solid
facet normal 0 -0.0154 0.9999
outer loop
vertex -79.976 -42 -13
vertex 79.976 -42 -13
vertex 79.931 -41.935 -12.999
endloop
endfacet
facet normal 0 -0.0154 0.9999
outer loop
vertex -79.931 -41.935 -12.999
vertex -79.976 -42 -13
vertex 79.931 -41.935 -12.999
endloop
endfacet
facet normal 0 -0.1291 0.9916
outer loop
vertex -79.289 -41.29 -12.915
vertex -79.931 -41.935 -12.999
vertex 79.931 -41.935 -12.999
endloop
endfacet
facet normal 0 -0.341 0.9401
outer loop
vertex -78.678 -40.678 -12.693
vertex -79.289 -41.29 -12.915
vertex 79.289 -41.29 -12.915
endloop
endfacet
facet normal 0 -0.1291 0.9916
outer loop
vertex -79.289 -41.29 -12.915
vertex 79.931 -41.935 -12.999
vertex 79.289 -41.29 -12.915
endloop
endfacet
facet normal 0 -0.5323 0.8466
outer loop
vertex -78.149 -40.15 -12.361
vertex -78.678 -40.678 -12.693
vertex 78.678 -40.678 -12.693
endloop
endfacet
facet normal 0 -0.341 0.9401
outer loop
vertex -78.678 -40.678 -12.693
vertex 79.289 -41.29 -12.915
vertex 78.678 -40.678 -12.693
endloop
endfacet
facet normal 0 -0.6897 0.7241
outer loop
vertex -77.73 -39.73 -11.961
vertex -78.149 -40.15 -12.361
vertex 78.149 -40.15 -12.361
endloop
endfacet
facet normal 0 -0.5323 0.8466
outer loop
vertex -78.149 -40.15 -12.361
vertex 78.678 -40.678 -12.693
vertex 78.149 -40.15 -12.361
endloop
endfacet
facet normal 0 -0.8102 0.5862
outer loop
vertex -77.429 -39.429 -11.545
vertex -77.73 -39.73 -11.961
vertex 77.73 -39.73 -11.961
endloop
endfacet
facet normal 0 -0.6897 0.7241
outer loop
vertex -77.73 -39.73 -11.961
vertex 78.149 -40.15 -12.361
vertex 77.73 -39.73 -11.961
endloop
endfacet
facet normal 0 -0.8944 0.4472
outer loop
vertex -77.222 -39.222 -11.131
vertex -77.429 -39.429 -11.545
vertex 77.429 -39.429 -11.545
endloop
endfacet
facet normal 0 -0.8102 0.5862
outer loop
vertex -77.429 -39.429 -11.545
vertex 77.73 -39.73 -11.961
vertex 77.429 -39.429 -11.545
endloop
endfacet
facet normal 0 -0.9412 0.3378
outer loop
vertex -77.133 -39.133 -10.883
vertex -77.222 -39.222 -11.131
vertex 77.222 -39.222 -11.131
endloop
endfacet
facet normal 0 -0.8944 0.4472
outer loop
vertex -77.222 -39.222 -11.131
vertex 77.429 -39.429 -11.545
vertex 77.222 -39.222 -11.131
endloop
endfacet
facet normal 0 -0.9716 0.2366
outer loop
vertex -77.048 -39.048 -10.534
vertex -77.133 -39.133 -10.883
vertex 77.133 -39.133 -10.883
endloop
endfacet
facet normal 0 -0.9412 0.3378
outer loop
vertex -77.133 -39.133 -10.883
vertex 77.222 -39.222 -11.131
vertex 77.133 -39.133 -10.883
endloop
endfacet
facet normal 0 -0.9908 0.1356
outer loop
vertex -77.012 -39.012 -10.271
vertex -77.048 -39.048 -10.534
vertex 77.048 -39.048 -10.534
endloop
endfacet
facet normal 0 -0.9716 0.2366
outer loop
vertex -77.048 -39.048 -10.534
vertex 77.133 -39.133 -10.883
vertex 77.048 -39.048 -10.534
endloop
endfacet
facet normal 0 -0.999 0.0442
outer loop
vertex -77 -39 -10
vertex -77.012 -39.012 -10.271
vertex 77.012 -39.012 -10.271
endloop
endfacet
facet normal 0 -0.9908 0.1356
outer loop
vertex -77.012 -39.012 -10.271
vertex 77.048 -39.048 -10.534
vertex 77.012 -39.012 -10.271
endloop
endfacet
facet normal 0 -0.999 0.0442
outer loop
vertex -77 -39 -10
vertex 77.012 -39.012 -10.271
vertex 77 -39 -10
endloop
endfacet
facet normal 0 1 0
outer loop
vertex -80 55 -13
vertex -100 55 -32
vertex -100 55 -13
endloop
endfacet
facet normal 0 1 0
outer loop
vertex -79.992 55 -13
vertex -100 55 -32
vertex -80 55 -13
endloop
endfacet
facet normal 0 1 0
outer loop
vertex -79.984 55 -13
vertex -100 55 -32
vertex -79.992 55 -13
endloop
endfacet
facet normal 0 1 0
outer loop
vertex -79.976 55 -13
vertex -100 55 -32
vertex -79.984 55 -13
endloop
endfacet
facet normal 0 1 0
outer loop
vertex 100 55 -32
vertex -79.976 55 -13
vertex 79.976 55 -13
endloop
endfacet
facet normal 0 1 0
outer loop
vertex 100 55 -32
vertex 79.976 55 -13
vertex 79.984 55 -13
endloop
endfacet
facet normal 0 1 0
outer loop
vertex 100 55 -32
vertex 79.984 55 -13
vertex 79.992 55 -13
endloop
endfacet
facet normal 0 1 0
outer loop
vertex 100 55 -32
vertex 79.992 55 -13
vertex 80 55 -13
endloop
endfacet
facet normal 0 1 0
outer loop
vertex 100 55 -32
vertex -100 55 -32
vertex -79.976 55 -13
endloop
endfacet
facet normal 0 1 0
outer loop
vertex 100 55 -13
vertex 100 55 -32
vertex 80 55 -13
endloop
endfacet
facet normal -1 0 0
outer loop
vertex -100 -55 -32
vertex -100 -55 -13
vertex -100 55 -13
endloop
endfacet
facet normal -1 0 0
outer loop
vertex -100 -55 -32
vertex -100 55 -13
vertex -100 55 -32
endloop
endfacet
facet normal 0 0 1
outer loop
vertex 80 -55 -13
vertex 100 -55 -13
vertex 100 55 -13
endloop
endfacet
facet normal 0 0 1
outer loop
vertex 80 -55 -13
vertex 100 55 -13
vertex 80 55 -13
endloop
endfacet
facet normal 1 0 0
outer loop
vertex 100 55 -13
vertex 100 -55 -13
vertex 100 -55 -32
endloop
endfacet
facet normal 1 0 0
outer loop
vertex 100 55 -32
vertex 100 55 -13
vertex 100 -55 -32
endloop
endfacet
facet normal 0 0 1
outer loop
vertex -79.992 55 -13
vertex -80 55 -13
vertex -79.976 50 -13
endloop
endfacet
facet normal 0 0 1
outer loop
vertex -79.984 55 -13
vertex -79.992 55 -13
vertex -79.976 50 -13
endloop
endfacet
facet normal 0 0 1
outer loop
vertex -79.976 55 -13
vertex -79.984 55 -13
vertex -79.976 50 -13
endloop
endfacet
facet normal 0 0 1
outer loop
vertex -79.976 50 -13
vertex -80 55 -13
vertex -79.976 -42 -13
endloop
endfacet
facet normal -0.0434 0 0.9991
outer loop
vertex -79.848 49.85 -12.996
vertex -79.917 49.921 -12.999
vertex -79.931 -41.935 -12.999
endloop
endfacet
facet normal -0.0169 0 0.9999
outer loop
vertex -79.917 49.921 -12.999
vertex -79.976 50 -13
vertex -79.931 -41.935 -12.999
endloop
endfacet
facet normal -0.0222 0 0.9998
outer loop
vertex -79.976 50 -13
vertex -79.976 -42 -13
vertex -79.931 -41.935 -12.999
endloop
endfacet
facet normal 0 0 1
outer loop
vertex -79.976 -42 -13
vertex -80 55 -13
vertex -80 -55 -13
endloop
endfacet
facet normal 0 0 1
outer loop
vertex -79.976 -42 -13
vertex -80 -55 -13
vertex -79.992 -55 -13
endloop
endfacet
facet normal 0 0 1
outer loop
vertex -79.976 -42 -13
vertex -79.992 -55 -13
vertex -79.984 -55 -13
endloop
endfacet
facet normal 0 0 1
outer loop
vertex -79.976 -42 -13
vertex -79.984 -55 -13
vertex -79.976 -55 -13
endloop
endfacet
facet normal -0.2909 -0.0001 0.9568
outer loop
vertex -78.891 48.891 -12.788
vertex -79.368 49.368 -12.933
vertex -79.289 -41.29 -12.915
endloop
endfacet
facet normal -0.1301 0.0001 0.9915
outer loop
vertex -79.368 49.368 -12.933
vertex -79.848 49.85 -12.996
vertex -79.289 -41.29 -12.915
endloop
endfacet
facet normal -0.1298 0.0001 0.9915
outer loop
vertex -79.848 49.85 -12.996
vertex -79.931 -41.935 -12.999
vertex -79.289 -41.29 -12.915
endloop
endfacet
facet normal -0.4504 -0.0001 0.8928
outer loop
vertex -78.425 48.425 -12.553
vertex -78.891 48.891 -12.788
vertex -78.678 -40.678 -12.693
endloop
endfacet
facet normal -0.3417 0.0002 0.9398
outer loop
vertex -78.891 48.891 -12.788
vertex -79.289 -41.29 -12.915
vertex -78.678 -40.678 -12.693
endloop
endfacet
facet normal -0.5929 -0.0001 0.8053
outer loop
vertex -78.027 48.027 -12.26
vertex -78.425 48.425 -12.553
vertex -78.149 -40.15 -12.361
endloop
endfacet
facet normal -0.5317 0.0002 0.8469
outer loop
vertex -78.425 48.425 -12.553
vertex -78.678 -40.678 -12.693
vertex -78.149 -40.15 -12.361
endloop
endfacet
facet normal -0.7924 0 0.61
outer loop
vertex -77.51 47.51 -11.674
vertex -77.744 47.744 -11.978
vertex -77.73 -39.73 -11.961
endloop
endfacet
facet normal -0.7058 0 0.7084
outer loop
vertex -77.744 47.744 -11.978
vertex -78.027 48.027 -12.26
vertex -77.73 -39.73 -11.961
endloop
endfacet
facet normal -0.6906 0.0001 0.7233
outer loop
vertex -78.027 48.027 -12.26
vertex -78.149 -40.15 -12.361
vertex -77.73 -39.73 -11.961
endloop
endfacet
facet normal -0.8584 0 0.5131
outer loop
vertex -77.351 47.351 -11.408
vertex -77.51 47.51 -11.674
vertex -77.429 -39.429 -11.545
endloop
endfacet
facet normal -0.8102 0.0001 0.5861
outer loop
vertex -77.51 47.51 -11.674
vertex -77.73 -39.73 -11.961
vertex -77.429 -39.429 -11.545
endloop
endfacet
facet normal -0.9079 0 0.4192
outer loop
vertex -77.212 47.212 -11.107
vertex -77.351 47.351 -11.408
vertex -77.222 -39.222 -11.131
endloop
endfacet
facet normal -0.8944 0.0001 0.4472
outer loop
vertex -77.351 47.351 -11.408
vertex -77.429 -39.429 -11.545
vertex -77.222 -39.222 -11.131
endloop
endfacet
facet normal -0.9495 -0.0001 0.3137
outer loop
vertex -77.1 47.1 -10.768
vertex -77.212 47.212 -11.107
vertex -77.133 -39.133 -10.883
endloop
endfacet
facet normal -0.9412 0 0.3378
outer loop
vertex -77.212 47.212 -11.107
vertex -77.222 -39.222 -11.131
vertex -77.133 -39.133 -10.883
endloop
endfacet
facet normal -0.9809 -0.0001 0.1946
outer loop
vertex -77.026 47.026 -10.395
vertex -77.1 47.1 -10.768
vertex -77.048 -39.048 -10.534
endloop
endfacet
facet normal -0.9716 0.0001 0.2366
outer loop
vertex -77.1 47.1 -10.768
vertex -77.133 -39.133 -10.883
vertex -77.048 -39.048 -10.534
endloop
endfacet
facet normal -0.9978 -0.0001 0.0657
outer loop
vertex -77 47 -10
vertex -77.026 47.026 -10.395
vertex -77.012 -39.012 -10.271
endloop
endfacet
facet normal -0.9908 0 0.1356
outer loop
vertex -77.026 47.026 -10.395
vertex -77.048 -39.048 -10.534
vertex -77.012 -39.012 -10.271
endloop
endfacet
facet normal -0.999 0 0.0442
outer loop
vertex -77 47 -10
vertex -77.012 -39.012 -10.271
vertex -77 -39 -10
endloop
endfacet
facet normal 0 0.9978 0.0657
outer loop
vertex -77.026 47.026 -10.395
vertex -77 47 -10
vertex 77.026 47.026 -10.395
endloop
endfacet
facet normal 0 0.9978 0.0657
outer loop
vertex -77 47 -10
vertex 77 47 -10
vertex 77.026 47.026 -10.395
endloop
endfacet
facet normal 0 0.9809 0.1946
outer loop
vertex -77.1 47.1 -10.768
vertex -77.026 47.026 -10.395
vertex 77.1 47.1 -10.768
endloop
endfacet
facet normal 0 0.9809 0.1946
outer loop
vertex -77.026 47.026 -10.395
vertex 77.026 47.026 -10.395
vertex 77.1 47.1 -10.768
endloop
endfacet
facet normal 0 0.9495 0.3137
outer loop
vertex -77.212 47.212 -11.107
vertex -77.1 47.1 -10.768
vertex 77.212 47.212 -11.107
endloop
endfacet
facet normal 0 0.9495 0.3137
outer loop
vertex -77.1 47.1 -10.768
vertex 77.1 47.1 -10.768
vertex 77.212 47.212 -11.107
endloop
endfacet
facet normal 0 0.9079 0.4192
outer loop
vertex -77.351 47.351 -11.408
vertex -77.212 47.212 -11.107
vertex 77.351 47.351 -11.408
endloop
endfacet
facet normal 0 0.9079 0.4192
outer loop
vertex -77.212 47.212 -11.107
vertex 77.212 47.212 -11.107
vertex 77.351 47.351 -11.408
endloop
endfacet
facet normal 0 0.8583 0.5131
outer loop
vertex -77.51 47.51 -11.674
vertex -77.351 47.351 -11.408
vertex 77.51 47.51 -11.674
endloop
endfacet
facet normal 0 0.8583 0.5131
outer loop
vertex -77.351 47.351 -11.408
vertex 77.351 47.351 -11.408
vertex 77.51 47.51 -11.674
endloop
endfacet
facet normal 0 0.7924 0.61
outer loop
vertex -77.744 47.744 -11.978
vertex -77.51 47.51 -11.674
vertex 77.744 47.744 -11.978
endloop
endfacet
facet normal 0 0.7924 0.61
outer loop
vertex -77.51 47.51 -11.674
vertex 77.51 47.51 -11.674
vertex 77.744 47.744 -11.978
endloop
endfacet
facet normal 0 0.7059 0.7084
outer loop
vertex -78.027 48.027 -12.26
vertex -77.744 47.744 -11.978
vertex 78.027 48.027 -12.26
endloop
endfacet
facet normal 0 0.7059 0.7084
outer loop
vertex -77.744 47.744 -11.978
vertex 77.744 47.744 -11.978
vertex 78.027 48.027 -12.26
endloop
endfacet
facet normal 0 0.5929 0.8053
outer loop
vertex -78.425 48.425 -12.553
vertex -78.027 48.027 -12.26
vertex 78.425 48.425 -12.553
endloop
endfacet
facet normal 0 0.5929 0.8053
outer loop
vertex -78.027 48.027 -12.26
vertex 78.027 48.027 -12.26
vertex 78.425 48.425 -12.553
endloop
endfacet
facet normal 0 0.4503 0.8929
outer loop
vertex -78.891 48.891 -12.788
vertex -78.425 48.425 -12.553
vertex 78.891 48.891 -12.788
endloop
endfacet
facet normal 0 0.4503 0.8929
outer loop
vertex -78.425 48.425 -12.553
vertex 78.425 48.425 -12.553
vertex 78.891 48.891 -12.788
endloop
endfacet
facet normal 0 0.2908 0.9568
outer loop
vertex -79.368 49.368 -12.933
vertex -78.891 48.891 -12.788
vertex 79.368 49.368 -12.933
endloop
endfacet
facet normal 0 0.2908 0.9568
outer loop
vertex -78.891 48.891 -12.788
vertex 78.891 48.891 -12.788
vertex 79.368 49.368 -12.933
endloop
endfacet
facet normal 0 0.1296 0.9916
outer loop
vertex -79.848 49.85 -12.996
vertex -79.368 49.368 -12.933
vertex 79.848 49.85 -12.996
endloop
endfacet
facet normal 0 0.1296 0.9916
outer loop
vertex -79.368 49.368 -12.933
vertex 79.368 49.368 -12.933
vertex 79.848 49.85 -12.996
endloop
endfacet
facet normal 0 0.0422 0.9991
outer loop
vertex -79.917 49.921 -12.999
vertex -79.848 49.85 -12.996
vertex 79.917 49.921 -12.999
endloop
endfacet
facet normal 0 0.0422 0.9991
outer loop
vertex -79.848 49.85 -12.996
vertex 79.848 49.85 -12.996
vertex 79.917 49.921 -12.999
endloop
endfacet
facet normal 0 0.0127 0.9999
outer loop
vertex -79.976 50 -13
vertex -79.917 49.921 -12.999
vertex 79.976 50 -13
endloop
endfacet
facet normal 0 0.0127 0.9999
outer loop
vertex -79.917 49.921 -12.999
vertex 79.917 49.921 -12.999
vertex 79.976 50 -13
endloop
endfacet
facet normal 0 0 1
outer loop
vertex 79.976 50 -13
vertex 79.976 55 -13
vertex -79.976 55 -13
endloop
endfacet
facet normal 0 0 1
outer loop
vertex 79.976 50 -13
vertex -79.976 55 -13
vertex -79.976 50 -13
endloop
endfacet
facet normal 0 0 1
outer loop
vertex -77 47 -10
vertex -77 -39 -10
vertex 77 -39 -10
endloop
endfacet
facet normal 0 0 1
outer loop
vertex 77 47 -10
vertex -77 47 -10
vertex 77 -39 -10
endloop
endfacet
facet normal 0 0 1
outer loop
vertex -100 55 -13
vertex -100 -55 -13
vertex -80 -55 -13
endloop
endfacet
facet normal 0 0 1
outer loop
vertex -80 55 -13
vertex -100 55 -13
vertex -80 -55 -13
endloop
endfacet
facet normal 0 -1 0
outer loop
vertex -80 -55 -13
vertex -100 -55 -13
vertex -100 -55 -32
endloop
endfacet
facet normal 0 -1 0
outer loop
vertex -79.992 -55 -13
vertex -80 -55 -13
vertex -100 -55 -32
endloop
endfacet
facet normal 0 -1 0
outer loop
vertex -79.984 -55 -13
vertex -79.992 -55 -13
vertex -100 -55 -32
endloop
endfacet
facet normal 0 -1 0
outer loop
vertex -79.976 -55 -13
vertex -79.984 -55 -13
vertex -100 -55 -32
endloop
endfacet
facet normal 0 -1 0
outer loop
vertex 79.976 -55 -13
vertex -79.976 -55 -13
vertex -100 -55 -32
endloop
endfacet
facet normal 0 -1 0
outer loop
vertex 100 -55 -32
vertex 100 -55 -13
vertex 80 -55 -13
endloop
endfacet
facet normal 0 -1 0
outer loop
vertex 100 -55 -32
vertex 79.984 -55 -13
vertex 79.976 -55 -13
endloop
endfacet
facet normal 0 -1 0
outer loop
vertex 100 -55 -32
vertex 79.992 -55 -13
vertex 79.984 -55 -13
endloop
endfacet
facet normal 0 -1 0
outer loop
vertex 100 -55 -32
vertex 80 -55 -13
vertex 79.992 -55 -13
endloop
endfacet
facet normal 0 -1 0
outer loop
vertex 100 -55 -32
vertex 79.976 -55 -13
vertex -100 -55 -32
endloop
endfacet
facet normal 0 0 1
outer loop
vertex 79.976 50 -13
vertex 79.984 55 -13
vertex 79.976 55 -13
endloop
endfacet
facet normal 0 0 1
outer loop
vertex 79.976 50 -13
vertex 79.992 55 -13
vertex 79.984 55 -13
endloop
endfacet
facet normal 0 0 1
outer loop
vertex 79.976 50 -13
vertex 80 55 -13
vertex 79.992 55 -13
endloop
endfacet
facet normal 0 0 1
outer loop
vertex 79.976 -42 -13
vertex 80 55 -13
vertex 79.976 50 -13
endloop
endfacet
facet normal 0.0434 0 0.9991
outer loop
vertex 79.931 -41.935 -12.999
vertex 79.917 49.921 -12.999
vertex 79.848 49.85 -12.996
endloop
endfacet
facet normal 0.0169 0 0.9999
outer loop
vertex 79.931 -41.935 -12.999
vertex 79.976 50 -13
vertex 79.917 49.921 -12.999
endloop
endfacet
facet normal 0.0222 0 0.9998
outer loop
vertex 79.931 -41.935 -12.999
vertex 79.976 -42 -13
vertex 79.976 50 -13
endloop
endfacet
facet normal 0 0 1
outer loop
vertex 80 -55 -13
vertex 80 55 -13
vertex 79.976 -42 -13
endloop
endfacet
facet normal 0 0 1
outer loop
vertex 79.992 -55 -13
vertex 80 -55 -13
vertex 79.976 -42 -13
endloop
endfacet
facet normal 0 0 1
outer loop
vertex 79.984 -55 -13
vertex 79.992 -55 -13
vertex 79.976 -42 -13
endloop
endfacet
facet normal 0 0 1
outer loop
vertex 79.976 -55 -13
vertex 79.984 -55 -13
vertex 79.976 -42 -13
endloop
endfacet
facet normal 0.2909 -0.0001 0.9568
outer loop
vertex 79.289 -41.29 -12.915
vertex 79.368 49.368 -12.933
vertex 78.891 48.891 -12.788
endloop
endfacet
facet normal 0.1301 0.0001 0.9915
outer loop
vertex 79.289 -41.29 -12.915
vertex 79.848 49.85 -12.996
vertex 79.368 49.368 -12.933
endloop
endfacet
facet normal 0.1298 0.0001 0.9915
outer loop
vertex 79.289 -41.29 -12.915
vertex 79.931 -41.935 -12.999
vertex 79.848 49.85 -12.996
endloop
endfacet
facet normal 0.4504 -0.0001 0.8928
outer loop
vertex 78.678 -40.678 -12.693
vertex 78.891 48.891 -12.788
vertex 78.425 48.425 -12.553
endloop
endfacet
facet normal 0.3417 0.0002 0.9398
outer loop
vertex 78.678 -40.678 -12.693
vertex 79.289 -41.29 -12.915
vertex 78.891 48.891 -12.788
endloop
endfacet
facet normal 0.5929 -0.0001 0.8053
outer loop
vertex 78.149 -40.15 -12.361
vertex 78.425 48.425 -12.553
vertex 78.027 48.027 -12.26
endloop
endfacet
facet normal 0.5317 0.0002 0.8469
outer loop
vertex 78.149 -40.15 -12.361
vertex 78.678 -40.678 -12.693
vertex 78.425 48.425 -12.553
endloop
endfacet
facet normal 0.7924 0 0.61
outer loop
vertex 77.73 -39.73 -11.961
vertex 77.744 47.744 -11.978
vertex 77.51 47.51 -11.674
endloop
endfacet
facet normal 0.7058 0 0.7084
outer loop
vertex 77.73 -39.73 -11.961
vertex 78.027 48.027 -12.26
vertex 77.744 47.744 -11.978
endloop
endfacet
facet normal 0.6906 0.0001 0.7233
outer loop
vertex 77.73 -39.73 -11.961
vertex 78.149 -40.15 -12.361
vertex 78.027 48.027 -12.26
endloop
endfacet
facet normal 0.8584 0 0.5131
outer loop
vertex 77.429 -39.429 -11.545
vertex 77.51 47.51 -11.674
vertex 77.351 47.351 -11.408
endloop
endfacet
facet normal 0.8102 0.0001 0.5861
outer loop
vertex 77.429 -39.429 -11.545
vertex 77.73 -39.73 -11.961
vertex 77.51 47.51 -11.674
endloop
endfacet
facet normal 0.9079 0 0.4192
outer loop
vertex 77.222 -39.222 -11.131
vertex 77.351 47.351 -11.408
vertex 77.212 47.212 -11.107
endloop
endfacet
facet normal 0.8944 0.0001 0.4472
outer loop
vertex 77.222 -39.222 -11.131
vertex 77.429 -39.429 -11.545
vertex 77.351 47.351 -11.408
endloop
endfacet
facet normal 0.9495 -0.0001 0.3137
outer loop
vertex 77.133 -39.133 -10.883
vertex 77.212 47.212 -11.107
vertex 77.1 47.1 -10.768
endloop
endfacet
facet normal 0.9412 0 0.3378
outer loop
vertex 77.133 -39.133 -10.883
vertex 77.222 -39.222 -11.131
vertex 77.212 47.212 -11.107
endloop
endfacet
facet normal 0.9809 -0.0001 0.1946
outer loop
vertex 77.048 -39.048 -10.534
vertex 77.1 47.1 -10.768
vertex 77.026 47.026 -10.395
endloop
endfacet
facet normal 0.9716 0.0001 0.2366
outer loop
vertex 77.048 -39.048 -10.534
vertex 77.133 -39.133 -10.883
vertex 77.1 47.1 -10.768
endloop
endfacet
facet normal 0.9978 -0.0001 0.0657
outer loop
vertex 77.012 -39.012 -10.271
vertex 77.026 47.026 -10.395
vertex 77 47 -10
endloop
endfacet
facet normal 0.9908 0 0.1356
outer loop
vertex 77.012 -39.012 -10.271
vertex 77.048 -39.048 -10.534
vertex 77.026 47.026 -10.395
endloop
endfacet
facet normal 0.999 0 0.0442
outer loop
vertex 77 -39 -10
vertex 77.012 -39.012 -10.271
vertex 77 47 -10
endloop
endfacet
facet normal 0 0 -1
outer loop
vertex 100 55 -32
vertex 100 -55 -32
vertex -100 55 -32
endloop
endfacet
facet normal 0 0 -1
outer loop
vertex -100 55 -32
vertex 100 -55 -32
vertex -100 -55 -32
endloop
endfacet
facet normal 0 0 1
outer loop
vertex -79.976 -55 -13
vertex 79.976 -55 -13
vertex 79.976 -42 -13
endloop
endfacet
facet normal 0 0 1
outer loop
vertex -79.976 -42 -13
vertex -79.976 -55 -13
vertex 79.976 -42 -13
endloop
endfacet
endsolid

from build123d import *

# Parameters (mm, degrees)
PAD002_DEPTH = 102.5
PAD003_DEPTH = 60


with BuildPart() as pad007:
    # Sketch006 → Pad002 (new body, symmetric)
    with BuildSketch(Plane(origin=(0, 0, 0.0001), x_dir=(0, 1, 0), z_dir=(1, 0, 0))):
        with BuildLine():
            ThreePointArc((-42, -13), (-39.87868, -12.12132), (-39, -10))
            Line((-39, -10), (47, -10))
            ThreePointArc((47, -10), (47.87868, -12.12132), (50, -13))
            Line((55, -13), (50, -13))
            Line((55, -33), (55, -13))
            Line((-55, -33), (55, -33))
            Line((-55, -13), (-55, -33))
            Line((-55, -13), (-42, -13))
        make_face()
    extrude(amount=PAD002_DEPTH, both=True)


with BuildPart() as pad008:
    # Sketch005 → Pad003 (new body, symmetric)
    with BuildSketch(Plane.XZ):
        with BuildLine():
            ThreePointArc((-80, -13), (-77.87868, -12.12132), (-77, -10))
            Line((0, -10), (-77, -10))
            Line((0, -32), (0, -10))
            Line((-100, -32), (0, -32))
            Line((-100, -13), (-100, -32))
            Line((-100, -13), (-80, -13))
        make_face()
    extrude(amount=PAD003_DEPTH, both=True)


with BuildPart() as part_mirroring:
    # Part__Mirroring: instance of Pad008
    add(pad008.part.mirror(Plane(origin=(0, 0, 0), x_dir=(0, -1, 0), z_dir=(1, 0, 0))))


with BuildPart() as common:
    # Fusion base: copy of Pad008
    add(pad008.part)

    # Fusion: union Part__Mirroring
    add(part_mirroring.part)

    # Common: intersect Pad007
    add(pad007.part, mode=Mode.INTERSECT)


solid = common.part
